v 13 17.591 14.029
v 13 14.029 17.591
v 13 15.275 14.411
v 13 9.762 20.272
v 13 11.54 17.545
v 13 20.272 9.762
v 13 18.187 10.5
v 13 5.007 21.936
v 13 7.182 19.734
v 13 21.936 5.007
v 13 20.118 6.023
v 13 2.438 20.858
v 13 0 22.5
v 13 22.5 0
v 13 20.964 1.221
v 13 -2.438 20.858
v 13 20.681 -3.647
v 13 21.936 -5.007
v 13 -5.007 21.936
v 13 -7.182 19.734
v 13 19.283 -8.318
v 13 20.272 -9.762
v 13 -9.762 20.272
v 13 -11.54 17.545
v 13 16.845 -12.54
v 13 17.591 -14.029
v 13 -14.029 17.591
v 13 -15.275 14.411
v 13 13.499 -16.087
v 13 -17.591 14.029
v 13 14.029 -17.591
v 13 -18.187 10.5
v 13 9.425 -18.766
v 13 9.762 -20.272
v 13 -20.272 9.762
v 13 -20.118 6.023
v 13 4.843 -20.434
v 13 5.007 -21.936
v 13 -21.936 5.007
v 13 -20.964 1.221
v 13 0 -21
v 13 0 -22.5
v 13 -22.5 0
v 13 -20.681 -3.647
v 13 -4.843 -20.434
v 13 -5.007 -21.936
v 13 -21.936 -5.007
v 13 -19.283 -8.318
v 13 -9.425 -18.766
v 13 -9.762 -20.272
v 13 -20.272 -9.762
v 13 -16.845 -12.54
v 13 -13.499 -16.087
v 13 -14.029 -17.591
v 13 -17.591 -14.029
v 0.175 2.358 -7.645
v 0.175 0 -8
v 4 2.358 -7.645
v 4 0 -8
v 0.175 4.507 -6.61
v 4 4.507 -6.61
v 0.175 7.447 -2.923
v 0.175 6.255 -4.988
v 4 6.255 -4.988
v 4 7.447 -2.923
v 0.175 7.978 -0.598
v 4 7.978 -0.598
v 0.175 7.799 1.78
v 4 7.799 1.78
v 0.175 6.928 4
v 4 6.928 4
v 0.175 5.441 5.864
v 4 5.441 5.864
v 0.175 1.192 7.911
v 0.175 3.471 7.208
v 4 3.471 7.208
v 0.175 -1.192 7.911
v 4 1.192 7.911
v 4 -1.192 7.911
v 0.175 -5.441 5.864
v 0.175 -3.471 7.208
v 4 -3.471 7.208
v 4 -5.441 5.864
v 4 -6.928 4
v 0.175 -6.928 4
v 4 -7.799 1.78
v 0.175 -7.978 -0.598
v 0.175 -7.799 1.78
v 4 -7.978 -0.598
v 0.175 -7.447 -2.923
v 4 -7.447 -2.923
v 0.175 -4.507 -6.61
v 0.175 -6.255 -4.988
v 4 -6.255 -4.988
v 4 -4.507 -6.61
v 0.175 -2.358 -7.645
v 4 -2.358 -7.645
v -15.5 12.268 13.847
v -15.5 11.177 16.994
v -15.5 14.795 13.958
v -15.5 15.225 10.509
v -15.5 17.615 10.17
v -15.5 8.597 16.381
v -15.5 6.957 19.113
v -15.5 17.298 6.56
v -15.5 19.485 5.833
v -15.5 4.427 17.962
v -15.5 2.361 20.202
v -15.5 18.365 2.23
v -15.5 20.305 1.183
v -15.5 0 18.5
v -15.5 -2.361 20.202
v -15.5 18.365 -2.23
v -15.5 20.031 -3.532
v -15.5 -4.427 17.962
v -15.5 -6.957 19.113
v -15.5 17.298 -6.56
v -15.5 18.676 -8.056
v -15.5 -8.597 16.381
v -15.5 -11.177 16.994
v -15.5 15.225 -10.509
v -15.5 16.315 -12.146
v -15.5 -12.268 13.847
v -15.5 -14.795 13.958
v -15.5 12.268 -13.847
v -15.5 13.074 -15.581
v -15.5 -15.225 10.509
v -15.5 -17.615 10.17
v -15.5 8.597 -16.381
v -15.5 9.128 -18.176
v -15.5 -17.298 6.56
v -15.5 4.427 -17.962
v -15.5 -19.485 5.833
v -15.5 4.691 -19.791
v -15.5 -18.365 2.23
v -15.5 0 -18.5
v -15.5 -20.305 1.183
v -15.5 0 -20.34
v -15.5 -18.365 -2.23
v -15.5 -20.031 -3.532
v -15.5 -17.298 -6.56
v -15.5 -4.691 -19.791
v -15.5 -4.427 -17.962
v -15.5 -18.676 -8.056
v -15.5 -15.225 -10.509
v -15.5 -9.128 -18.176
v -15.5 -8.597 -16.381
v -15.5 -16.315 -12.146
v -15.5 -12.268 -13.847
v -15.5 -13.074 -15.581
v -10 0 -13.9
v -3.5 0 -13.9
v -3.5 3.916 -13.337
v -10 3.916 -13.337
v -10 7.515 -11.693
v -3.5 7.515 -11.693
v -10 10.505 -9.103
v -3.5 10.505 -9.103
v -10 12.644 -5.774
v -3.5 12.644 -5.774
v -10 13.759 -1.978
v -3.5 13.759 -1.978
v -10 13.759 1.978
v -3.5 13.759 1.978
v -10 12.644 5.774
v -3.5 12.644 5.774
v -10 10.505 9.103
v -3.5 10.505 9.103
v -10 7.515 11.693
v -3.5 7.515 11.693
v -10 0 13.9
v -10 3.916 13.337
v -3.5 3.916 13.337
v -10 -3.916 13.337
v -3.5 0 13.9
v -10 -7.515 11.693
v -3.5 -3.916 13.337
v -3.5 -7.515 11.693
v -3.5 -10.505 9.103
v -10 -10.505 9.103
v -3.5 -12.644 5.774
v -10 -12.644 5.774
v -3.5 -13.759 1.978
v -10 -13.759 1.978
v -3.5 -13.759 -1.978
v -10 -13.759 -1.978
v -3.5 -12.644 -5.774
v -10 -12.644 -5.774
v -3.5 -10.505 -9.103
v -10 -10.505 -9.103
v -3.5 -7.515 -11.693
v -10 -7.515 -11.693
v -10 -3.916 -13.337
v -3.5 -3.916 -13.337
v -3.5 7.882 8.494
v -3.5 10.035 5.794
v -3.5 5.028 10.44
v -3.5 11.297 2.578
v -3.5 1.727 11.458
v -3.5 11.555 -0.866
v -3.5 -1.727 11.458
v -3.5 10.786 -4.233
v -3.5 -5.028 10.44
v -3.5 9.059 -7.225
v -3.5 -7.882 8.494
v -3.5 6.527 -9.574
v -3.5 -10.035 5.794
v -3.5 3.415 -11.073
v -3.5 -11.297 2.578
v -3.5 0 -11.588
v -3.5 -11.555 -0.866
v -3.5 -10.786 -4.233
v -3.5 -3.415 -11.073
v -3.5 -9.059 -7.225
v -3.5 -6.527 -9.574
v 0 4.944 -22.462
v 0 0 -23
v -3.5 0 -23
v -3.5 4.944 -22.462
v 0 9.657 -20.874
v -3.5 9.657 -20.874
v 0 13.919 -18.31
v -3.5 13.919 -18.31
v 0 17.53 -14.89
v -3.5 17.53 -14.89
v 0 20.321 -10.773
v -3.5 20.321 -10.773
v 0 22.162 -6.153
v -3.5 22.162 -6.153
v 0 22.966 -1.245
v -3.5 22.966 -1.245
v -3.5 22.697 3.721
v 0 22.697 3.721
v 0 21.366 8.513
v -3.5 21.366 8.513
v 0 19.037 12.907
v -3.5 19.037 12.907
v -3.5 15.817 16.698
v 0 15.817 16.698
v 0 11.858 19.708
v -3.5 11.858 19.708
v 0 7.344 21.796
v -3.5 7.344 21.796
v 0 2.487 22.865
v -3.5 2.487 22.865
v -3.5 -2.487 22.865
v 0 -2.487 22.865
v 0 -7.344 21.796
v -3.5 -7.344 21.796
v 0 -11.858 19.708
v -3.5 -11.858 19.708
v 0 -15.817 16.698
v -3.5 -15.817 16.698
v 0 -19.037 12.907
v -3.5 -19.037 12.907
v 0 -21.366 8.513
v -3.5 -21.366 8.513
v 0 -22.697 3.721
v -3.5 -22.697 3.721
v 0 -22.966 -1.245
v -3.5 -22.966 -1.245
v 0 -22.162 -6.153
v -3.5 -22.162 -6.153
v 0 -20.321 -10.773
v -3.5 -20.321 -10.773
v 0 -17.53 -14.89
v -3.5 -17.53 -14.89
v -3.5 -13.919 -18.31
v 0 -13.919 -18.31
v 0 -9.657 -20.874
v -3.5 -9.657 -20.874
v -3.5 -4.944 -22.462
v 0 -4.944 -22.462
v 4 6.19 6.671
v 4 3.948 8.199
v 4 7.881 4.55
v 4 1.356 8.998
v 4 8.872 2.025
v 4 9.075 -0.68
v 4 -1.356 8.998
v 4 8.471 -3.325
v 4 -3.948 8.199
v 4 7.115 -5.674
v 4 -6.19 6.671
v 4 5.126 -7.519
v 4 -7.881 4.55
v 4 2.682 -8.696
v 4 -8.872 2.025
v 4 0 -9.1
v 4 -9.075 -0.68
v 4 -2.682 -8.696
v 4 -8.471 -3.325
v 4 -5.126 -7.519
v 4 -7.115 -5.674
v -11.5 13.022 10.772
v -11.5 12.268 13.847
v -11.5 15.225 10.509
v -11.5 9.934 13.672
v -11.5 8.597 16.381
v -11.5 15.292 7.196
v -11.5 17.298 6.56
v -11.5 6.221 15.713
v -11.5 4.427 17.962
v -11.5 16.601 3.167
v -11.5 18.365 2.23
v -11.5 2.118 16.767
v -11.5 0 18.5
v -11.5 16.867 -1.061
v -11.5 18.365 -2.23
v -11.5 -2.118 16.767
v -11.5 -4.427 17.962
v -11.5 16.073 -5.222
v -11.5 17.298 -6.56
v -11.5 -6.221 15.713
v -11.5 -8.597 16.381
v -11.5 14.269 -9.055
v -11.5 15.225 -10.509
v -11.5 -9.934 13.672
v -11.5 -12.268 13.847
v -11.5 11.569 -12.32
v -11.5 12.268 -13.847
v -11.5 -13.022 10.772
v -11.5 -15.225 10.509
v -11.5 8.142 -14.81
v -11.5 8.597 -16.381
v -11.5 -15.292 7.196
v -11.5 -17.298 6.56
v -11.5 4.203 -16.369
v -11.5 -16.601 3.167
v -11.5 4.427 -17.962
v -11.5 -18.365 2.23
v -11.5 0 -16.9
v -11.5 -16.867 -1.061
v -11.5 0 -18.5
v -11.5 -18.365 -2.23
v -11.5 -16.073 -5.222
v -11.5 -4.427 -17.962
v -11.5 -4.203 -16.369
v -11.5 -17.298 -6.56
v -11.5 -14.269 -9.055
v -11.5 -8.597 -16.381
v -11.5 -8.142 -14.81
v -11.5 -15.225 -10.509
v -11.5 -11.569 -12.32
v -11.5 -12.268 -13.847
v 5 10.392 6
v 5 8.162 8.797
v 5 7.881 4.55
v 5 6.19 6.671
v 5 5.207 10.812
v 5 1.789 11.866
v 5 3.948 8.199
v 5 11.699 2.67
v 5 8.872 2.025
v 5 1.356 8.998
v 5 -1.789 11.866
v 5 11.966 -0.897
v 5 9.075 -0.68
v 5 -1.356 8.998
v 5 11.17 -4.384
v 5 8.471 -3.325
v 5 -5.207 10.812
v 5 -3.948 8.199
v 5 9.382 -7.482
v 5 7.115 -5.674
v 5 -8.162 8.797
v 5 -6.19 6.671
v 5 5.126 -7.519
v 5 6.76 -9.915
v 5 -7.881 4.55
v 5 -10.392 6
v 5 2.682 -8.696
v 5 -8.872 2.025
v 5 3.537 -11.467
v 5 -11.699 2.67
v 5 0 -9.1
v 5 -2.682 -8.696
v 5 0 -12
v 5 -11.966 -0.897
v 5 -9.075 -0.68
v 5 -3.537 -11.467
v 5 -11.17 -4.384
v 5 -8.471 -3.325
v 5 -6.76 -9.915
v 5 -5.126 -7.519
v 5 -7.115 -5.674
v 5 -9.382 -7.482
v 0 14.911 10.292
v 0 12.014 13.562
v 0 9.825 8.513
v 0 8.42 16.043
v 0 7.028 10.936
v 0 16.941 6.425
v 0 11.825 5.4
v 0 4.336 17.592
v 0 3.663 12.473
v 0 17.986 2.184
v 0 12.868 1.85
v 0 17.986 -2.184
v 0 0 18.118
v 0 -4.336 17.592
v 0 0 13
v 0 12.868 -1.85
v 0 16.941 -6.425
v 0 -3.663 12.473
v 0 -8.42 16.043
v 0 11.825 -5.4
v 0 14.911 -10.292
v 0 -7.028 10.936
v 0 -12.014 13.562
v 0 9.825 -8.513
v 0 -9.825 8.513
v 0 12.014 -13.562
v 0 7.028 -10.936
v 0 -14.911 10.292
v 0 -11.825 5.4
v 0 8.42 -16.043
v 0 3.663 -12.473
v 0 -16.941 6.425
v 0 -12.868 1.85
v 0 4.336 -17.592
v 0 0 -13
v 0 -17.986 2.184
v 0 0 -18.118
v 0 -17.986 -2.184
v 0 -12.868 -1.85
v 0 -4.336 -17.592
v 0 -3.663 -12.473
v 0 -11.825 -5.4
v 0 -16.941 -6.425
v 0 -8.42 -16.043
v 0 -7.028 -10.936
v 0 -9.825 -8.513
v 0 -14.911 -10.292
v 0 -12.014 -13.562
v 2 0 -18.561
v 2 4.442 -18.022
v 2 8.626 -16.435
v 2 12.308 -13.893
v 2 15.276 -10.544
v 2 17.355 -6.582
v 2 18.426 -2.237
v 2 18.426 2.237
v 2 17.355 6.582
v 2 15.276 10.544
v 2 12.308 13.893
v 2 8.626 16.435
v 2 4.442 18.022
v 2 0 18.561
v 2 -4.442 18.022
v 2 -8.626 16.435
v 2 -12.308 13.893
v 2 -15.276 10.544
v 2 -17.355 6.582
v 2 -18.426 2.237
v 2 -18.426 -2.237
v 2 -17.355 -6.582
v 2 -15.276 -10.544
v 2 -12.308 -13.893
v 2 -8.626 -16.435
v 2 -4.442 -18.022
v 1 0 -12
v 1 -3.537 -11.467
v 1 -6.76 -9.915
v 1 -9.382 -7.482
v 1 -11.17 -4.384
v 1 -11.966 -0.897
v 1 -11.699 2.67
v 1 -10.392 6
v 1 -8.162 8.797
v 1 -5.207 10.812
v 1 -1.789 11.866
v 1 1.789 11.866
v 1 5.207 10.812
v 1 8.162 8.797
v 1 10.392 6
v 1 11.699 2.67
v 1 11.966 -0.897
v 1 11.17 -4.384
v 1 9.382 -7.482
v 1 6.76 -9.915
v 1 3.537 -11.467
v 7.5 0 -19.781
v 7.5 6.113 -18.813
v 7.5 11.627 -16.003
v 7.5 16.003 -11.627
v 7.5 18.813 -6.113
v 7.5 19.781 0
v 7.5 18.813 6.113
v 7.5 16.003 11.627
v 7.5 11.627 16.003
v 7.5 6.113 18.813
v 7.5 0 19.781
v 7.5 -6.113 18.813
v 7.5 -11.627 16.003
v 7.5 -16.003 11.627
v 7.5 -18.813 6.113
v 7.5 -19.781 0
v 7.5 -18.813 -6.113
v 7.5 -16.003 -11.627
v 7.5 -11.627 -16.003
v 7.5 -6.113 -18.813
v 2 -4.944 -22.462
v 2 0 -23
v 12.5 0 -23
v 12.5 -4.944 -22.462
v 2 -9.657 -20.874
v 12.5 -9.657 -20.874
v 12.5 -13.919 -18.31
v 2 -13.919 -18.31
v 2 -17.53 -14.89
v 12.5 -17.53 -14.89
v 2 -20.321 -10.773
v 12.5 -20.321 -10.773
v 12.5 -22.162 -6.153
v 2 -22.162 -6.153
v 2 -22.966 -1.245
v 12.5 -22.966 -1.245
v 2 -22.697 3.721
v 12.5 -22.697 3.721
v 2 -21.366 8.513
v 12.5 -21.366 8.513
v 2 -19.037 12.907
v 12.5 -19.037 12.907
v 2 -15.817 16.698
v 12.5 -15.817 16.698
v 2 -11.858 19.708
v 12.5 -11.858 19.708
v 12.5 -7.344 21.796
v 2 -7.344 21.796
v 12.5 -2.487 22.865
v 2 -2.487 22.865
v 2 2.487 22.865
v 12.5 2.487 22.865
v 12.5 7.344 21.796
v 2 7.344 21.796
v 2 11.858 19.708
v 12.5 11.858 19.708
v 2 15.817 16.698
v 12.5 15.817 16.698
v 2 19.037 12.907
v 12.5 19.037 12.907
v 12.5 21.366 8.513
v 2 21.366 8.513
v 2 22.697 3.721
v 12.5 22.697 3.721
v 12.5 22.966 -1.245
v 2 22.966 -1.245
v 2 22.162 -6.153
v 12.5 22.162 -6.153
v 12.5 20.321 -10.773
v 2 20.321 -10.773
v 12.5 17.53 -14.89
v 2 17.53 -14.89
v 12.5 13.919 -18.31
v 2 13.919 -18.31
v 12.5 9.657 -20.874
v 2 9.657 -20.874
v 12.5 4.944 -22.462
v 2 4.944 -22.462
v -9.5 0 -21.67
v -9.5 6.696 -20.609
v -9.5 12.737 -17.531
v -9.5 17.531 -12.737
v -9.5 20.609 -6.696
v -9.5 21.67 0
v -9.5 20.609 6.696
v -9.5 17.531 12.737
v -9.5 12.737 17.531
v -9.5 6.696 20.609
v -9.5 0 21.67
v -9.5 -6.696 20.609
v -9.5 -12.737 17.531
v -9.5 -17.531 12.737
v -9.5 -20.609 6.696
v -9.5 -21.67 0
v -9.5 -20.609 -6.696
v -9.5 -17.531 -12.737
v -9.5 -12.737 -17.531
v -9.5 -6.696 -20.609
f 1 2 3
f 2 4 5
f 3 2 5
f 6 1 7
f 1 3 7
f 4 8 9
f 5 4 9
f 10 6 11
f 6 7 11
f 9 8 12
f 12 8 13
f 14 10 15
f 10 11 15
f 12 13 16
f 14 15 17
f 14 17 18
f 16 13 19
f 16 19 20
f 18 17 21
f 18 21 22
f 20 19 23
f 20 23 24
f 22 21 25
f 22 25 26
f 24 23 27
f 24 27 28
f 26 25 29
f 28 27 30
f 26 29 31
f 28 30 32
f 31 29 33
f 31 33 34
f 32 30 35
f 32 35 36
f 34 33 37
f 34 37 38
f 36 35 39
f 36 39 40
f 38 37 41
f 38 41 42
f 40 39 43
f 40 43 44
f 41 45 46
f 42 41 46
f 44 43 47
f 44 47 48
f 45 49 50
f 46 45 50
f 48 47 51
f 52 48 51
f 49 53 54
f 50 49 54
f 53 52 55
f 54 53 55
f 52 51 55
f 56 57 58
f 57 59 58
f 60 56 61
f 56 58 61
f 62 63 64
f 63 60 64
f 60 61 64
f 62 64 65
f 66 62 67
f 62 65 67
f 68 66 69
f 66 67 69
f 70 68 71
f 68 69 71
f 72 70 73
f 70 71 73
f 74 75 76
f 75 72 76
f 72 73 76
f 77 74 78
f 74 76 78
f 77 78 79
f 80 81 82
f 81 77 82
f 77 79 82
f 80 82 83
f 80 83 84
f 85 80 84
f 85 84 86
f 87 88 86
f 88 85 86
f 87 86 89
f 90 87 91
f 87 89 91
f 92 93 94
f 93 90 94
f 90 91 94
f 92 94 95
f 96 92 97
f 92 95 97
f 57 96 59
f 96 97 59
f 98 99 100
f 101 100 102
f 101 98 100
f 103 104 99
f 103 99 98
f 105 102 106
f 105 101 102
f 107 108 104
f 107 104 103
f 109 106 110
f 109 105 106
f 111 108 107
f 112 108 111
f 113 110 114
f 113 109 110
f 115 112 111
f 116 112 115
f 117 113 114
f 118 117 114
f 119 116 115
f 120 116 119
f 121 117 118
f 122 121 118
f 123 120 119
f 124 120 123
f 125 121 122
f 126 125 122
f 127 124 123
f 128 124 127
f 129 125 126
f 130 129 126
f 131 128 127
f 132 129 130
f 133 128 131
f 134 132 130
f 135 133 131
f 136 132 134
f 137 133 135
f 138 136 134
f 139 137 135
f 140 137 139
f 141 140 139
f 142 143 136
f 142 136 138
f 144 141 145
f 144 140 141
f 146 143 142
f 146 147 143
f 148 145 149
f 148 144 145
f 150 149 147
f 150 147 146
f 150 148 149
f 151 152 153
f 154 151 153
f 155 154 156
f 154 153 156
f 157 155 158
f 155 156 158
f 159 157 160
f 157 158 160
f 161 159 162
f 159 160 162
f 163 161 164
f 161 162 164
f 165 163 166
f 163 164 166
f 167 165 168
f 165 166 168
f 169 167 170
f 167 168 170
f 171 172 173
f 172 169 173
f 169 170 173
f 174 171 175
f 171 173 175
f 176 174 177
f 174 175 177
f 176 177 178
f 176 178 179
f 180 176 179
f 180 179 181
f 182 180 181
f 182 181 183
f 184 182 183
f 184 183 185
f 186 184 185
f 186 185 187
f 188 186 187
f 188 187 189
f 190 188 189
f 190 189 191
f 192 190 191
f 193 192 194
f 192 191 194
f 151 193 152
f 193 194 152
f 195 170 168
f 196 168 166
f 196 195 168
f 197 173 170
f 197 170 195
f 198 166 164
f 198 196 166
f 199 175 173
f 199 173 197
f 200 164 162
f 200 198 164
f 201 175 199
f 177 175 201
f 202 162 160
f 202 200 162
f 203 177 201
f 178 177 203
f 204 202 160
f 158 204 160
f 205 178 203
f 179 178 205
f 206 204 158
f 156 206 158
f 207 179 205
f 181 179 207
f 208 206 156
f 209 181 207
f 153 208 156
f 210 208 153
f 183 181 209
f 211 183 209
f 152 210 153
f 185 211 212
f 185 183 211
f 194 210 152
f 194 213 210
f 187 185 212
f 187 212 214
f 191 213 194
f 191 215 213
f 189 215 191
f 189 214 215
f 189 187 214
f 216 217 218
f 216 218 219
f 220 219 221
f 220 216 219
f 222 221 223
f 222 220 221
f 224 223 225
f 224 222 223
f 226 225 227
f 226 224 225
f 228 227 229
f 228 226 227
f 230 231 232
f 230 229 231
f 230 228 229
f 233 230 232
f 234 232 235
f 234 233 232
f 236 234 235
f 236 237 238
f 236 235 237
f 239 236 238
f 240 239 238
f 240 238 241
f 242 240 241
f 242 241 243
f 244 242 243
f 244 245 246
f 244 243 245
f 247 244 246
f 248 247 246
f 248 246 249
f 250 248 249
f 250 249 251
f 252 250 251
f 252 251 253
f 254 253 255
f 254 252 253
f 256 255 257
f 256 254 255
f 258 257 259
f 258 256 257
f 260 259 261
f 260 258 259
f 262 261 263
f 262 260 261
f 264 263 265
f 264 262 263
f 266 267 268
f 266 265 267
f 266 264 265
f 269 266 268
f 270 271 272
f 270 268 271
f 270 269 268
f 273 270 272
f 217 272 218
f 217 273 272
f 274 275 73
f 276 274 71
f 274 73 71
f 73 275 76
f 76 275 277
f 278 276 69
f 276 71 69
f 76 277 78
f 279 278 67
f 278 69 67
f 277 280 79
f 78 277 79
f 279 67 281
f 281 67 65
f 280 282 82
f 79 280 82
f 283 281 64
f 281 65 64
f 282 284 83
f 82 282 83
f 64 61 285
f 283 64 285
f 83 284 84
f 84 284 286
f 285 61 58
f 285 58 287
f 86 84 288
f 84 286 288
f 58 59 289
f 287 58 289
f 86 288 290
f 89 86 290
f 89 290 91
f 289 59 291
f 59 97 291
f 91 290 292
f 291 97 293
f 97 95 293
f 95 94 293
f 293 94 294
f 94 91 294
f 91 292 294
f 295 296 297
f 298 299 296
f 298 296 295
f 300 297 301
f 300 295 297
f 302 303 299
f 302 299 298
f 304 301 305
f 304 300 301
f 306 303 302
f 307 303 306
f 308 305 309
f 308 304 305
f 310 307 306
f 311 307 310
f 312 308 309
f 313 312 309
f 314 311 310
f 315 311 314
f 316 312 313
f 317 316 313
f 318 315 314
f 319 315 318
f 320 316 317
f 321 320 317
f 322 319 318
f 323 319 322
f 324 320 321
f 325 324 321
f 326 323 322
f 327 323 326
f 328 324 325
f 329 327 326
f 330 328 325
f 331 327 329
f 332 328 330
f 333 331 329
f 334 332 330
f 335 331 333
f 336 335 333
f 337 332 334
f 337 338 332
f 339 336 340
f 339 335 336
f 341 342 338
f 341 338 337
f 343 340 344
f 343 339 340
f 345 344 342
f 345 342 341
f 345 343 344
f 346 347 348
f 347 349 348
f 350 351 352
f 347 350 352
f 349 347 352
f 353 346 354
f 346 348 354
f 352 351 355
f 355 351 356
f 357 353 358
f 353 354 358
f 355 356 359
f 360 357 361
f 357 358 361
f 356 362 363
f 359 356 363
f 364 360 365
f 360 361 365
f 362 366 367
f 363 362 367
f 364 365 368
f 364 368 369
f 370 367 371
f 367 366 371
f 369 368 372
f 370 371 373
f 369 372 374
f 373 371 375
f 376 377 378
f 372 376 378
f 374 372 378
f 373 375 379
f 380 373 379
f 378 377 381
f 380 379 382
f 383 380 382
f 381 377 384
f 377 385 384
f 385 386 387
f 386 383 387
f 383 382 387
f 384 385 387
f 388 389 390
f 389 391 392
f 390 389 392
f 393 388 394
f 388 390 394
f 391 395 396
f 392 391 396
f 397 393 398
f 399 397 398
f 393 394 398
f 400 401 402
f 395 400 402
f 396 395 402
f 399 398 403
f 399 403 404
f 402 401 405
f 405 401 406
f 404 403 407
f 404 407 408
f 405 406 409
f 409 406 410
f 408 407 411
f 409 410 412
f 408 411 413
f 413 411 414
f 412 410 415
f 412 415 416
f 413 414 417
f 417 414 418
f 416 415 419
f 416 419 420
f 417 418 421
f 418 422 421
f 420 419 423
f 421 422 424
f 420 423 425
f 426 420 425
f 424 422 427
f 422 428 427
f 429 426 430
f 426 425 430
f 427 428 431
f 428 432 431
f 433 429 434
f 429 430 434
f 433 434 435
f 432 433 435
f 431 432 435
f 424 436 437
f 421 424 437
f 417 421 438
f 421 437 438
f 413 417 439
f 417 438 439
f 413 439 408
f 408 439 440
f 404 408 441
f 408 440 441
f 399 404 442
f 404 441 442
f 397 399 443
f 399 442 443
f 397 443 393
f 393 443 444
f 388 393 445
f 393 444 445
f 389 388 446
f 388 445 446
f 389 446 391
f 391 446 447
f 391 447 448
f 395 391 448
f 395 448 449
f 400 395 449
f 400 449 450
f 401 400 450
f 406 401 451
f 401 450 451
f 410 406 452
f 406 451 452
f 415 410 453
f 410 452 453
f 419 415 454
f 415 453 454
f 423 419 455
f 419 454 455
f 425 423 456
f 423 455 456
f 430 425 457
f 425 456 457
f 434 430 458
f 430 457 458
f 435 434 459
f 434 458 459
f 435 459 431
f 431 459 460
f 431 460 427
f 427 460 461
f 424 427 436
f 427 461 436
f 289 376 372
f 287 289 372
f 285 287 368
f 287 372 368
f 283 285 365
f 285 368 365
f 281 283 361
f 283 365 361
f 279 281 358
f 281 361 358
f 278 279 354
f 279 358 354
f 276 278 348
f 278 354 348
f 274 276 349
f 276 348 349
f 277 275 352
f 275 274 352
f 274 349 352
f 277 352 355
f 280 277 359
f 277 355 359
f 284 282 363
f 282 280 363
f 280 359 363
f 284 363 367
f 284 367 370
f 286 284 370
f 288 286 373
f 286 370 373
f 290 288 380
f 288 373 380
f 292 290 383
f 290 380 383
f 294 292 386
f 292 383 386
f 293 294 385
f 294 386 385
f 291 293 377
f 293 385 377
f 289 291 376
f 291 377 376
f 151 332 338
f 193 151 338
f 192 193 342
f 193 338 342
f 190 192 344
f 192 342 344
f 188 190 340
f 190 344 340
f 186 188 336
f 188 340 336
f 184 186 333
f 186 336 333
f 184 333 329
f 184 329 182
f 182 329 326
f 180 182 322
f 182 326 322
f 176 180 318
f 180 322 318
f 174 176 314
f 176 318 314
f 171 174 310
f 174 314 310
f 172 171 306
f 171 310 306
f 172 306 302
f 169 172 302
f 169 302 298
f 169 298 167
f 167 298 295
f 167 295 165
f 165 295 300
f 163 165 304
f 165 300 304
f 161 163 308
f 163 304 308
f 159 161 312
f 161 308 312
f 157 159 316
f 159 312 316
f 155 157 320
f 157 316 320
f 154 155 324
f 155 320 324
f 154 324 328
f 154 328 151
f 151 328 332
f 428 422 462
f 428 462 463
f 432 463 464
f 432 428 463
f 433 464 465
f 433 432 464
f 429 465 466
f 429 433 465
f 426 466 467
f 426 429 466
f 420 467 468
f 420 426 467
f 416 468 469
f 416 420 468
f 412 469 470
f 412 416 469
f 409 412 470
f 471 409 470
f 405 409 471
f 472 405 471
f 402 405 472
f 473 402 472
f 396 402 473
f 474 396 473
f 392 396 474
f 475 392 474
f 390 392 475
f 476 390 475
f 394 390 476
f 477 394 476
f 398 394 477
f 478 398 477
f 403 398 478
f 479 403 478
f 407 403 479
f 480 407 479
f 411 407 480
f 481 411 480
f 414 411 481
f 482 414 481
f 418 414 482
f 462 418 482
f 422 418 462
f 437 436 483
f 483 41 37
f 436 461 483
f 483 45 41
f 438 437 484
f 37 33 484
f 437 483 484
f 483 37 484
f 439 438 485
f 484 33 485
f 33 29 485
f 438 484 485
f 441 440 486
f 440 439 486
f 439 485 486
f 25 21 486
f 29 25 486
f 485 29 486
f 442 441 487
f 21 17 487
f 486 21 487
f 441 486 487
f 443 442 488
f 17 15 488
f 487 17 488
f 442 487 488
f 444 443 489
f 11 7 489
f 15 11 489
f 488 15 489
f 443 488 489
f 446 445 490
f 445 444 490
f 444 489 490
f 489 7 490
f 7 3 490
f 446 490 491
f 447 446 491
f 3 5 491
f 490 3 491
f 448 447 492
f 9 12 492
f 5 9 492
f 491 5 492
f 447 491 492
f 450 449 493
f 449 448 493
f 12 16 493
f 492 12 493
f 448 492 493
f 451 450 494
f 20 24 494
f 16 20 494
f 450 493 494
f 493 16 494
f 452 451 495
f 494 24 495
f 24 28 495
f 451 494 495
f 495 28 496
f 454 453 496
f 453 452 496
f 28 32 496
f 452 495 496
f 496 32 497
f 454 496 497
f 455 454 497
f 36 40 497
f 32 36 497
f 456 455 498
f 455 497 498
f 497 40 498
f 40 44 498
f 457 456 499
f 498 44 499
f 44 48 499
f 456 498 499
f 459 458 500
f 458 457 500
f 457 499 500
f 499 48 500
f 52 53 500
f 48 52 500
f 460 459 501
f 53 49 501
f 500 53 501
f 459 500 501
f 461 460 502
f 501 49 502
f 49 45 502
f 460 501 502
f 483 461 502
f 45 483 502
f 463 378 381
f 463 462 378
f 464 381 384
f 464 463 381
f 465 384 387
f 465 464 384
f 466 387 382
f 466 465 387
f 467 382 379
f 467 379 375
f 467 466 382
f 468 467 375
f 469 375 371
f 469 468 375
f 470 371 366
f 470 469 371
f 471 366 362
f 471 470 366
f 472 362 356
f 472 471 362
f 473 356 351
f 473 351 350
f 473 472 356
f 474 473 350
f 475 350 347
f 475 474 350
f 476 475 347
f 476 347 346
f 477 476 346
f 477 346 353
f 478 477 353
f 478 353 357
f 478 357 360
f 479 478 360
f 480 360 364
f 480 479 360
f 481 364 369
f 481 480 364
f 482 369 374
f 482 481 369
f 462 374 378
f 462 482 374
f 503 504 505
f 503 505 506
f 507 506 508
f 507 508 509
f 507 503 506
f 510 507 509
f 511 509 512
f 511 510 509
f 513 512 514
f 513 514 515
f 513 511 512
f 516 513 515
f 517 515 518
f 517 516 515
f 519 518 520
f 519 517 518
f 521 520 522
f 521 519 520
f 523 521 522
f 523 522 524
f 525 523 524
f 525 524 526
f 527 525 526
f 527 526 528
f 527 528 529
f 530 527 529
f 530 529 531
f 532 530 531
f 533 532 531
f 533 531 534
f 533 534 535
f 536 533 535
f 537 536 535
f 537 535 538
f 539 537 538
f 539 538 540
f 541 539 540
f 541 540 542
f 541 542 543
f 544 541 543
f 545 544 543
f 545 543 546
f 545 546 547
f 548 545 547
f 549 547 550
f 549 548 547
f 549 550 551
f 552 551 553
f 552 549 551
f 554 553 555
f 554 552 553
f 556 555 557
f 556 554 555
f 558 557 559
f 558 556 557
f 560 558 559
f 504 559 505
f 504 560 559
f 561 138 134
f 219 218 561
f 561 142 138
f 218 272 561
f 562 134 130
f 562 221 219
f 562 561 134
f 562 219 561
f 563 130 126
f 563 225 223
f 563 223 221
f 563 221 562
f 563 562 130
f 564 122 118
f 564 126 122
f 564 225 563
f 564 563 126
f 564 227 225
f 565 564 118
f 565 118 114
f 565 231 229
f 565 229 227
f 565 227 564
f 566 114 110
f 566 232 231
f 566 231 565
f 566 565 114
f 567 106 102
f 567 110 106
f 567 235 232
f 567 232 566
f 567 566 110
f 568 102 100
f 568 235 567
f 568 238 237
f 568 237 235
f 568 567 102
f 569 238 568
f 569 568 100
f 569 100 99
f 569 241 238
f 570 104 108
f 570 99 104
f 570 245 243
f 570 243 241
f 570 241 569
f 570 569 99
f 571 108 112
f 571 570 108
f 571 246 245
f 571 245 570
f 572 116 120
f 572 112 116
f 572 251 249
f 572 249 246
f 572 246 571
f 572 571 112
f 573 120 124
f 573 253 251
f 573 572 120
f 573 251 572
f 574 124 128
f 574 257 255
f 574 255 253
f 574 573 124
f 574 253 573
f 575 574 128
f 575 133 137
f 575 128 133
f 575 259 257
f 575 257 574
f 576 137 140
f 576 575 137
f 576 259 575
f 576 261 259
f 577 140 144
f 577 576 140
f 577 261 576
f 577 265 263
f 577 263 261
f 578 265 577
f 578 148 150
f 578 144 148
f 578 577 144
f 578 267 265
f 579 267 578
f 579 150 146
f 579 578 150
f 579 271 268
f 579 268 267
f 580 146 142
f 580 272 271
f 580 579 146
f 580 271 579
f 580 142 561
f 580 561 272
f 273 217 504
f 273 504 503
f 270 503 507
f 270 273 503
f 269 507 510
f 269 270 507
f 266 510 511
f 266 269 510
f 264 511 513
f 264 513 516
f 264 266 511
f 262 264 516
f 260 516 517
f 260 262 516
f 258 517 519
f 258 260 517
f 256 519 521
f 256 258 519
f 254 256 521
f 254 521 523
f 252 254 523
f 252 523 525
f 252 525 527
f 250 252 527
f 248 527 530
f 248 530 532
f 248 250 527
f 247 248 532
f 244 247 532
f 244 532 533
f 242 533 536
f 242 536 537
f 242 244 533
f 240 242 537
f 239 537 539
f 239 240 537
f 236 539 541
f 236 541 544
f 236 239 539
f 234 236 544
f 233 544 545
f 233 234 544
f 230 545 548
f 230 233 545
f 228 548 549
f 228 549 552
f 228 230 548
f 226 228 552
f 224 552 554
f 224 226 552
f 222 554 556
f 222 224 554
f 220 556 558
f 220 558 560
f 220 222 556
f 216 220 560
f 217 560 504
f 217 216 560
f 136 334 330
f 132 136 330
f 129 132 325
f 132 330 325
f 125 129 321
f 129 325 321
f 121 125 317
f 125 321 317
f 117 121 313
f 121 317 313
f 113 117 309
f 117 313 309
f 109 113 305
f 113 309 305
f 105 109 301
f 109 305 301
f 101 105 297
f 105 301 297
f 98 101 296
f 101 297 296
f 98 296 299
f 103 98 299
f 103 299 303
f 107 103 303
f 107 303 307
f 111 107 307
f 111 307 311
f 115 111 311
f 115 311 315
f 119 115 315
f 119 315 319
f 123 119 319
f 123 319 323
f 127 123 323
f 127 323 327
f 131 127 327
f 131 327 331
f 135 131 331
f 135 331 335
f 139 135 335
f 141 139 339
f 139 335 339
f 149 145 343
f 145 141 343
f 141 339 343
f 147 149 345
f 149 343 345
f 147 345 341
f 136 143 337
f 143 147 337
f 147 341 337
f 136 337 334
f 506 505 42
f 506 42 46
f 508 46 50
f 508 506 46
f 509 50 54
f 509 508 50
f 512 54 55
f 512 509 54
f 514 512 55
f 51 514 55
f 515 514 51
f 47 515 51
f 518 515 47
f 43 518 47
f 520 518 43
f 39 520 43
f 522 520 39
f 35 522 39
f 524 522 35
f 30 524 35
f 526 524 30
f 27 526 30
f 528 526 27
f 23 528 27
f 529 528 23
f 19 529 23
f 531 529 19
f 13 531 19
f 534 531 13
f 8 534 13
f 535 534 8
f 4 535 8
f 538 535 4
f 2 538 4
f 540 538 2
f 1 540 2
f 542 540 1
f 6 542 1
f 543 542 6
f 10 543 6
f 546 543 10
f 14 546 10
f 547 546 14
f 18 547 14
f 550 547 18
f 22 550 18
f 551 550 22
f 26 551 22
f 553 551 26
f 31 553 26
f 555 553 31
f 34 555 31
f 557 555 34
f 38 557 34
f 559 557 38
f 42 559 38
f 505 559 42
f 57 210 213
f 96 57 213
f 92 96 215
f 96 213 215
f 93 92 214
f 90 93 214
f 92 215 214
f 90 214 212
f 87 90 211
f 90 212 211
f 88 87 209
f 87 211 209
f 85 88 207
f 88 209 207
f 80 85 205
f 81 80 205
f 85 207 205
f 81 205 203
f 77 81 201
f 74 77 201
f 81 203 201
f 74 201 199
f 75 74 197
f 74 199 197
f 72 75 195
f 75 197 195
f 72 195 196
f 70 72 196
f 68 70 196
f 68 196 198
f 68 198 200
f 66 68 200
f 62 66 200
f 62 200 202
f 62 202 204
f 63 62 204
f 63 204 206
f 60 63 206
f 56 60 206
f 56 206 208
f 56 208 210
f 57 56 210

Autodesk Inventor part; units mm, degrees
ref_plane "YZ Plane" through (0, 0, 0) normal (1, 0, 0) x (0, 1, 0)
ref_plane "XZ Plane" through (0, 0, 0) normal (0, 1, 0) x (-1, 0, 0)
ref_plane "XY Plane" through (0, 0, 0) normal (0, 0, 1) x (1, 0, 0)
sketch "Sketch1" plane through (0, 0, 0) normal (0, 1, 0) x (-1, 0, 0)
  line L0 (0, 0) -> (3.5, 0)
  line L1 (3.5, 0) -> (3.5, -8)
  line L2 (3.5, -8) -> (0, -8)
  line L3 (0, -8) -> (0, 0)
  line L4 (3.5, 0) -> (11.5, 0)
  line L5 (11.5, 0) -> (11.5, -13.9)
  line L6 (11.5, -13.9) -> (3.5, -13.9)
  line L7 (3.5, -13.9) -> (3.5, 0)
  line L8 (0, 0) -> (-13, 0)
  line L9 (-13, 0) -> (-13, -23)
  line L10 (-13, -23) -> (0, -23)
  line L11 (0, -23) -> (0, 0)
  line L12 (-13, -21) -> (0, -18.118)
  line L13 (-13, 0) -> (11.5, 0)
  line L14 (11.5, 0) -> (11.5, -23)
  line L15 (11.5, -23) -> (-13, -23)
  line L16 (-13, -23) -> (-13, 0)
  line L17 (-13, -23) -> (0, -20.118) construction
  line L18 (11.5, -23) -> (15.5, -23)
  line L19 (15.5, -23) -> (15.5, -18.5)
  line L20 (15.5, -18.5) -> (11.5, -18.5)
  line L21 (11.5, -18.5) -> (11.5, -23)
  line L22 (0, -8) -> (-5, -8)
  line L23 (-5, -8) -> (-5, -12)
  line L24 (-5, -12) -> (0, -12)
  line L25 (0, -12) -> (0, -8)
  line L26 (3.5, -8) -> (-2, -8)
  line L27 (-2, -8) -> (-2, -23)
  line L28 (-2, -23) -> (3.5, -23)
  line L29 (3.5, -23) -> (3.5, -8)
  line L30 (-5, -8) -> (-4, -8)
  line L31 (-4, -8) -> (-4, -9.1)
  line L32 (-4, -9.1) -> (-5, -9.1)
  line L33 (-5, -9.1) -> (-5, -8)
  line L34 (15.5, -20.3397) -> (3.5, -23)
  point P0 (3.5, -8)
  point P1 (0, -8)
  point P2 (0, -23)
  point P3 (11.5, -18.5)
  point P4 (0, -12)
  point P5 (0, -8)
  point P6 (0, -23)
  point P7 (3.5, -8)
  point P8 (-2, -12)
  point P9 (-2, -18.5614)
  point P10 (-4, -8)
  point P11 (-5, -9.1)
  point P12 (3.5, 0)
  point P13 (0, -12)
  dimension "d0" = 3.5
  dimension "d1" = 8
  dimension "d2" = 8
  dimension "d3" = 13.9
  dimension "d6" = 13
  dimension "d7" = 23
  dimension "d9" = 21
  dimension "d35" = 4
  dimension "d36" = 18.5
  dimension "d41" = 4
  dimension "d42" = 12.5
  dimension "d43" = 8.5
  dimension "d44" = 5.5
  dimension "d45" = 1
  dimension "d46" = 1.1
revolve "Revolution1" add sketch "Sketch1" angle 360 about axis through (0, 0, 0) along (-1, 0, 0) contours L2 L7 L29 L15 L11 | L11 L24 L27 L22 | L27 L24 L23 L32 L31 L22 | L12 L27 L10 L9 | L6 L14 L34 L29 | L11 L10 L27 L12 | L20 L19 L34 L14
chamfer "Chamfer2" distance 3.675 distance2 3.5875 1 edges at (-3.5, 0, 8) measured on face at (1.5, 1.2833, -7.8964)
chamfer "Chamfer4" distance 0.5 angle 45 1 edges at (13, 0, 23)
chamfer "Chamfer5" distance 1.5 distance2 3 1 edges at (-11.5, 0, 13.9) measured on face at (-6.1667, 1.1185, -13.8549)
chamfer "Chamfer6" distance 1 angle 45 1 edges at (0, 0, 12)
sketch "Sketch5" plane through (13, 0, 0) normal (1, 0, 0) x (0, 0, -1)
  line L0 (-22, -22) -> (22, -22)
  line L1 (22, -22) -> (22, 22)
  line L2 (22, 22) -> (-22, 22)
  line L3 (-22, 22) -> (-22, -22)
  line L4 (-22, -22) -> (22, 22) construction
  line L5 (22, -22) -> (-22, 22) construction
  circle A0 centre (0, 0) radius 35
  point P0 (0, 0)
  dimension "d53" = 44
  dimension "d54" = 44
  dimension "d55" = 70
equation "\"d53\" = d54"
properties part number "Flywheel" material "Brass, Soft Yellow"
